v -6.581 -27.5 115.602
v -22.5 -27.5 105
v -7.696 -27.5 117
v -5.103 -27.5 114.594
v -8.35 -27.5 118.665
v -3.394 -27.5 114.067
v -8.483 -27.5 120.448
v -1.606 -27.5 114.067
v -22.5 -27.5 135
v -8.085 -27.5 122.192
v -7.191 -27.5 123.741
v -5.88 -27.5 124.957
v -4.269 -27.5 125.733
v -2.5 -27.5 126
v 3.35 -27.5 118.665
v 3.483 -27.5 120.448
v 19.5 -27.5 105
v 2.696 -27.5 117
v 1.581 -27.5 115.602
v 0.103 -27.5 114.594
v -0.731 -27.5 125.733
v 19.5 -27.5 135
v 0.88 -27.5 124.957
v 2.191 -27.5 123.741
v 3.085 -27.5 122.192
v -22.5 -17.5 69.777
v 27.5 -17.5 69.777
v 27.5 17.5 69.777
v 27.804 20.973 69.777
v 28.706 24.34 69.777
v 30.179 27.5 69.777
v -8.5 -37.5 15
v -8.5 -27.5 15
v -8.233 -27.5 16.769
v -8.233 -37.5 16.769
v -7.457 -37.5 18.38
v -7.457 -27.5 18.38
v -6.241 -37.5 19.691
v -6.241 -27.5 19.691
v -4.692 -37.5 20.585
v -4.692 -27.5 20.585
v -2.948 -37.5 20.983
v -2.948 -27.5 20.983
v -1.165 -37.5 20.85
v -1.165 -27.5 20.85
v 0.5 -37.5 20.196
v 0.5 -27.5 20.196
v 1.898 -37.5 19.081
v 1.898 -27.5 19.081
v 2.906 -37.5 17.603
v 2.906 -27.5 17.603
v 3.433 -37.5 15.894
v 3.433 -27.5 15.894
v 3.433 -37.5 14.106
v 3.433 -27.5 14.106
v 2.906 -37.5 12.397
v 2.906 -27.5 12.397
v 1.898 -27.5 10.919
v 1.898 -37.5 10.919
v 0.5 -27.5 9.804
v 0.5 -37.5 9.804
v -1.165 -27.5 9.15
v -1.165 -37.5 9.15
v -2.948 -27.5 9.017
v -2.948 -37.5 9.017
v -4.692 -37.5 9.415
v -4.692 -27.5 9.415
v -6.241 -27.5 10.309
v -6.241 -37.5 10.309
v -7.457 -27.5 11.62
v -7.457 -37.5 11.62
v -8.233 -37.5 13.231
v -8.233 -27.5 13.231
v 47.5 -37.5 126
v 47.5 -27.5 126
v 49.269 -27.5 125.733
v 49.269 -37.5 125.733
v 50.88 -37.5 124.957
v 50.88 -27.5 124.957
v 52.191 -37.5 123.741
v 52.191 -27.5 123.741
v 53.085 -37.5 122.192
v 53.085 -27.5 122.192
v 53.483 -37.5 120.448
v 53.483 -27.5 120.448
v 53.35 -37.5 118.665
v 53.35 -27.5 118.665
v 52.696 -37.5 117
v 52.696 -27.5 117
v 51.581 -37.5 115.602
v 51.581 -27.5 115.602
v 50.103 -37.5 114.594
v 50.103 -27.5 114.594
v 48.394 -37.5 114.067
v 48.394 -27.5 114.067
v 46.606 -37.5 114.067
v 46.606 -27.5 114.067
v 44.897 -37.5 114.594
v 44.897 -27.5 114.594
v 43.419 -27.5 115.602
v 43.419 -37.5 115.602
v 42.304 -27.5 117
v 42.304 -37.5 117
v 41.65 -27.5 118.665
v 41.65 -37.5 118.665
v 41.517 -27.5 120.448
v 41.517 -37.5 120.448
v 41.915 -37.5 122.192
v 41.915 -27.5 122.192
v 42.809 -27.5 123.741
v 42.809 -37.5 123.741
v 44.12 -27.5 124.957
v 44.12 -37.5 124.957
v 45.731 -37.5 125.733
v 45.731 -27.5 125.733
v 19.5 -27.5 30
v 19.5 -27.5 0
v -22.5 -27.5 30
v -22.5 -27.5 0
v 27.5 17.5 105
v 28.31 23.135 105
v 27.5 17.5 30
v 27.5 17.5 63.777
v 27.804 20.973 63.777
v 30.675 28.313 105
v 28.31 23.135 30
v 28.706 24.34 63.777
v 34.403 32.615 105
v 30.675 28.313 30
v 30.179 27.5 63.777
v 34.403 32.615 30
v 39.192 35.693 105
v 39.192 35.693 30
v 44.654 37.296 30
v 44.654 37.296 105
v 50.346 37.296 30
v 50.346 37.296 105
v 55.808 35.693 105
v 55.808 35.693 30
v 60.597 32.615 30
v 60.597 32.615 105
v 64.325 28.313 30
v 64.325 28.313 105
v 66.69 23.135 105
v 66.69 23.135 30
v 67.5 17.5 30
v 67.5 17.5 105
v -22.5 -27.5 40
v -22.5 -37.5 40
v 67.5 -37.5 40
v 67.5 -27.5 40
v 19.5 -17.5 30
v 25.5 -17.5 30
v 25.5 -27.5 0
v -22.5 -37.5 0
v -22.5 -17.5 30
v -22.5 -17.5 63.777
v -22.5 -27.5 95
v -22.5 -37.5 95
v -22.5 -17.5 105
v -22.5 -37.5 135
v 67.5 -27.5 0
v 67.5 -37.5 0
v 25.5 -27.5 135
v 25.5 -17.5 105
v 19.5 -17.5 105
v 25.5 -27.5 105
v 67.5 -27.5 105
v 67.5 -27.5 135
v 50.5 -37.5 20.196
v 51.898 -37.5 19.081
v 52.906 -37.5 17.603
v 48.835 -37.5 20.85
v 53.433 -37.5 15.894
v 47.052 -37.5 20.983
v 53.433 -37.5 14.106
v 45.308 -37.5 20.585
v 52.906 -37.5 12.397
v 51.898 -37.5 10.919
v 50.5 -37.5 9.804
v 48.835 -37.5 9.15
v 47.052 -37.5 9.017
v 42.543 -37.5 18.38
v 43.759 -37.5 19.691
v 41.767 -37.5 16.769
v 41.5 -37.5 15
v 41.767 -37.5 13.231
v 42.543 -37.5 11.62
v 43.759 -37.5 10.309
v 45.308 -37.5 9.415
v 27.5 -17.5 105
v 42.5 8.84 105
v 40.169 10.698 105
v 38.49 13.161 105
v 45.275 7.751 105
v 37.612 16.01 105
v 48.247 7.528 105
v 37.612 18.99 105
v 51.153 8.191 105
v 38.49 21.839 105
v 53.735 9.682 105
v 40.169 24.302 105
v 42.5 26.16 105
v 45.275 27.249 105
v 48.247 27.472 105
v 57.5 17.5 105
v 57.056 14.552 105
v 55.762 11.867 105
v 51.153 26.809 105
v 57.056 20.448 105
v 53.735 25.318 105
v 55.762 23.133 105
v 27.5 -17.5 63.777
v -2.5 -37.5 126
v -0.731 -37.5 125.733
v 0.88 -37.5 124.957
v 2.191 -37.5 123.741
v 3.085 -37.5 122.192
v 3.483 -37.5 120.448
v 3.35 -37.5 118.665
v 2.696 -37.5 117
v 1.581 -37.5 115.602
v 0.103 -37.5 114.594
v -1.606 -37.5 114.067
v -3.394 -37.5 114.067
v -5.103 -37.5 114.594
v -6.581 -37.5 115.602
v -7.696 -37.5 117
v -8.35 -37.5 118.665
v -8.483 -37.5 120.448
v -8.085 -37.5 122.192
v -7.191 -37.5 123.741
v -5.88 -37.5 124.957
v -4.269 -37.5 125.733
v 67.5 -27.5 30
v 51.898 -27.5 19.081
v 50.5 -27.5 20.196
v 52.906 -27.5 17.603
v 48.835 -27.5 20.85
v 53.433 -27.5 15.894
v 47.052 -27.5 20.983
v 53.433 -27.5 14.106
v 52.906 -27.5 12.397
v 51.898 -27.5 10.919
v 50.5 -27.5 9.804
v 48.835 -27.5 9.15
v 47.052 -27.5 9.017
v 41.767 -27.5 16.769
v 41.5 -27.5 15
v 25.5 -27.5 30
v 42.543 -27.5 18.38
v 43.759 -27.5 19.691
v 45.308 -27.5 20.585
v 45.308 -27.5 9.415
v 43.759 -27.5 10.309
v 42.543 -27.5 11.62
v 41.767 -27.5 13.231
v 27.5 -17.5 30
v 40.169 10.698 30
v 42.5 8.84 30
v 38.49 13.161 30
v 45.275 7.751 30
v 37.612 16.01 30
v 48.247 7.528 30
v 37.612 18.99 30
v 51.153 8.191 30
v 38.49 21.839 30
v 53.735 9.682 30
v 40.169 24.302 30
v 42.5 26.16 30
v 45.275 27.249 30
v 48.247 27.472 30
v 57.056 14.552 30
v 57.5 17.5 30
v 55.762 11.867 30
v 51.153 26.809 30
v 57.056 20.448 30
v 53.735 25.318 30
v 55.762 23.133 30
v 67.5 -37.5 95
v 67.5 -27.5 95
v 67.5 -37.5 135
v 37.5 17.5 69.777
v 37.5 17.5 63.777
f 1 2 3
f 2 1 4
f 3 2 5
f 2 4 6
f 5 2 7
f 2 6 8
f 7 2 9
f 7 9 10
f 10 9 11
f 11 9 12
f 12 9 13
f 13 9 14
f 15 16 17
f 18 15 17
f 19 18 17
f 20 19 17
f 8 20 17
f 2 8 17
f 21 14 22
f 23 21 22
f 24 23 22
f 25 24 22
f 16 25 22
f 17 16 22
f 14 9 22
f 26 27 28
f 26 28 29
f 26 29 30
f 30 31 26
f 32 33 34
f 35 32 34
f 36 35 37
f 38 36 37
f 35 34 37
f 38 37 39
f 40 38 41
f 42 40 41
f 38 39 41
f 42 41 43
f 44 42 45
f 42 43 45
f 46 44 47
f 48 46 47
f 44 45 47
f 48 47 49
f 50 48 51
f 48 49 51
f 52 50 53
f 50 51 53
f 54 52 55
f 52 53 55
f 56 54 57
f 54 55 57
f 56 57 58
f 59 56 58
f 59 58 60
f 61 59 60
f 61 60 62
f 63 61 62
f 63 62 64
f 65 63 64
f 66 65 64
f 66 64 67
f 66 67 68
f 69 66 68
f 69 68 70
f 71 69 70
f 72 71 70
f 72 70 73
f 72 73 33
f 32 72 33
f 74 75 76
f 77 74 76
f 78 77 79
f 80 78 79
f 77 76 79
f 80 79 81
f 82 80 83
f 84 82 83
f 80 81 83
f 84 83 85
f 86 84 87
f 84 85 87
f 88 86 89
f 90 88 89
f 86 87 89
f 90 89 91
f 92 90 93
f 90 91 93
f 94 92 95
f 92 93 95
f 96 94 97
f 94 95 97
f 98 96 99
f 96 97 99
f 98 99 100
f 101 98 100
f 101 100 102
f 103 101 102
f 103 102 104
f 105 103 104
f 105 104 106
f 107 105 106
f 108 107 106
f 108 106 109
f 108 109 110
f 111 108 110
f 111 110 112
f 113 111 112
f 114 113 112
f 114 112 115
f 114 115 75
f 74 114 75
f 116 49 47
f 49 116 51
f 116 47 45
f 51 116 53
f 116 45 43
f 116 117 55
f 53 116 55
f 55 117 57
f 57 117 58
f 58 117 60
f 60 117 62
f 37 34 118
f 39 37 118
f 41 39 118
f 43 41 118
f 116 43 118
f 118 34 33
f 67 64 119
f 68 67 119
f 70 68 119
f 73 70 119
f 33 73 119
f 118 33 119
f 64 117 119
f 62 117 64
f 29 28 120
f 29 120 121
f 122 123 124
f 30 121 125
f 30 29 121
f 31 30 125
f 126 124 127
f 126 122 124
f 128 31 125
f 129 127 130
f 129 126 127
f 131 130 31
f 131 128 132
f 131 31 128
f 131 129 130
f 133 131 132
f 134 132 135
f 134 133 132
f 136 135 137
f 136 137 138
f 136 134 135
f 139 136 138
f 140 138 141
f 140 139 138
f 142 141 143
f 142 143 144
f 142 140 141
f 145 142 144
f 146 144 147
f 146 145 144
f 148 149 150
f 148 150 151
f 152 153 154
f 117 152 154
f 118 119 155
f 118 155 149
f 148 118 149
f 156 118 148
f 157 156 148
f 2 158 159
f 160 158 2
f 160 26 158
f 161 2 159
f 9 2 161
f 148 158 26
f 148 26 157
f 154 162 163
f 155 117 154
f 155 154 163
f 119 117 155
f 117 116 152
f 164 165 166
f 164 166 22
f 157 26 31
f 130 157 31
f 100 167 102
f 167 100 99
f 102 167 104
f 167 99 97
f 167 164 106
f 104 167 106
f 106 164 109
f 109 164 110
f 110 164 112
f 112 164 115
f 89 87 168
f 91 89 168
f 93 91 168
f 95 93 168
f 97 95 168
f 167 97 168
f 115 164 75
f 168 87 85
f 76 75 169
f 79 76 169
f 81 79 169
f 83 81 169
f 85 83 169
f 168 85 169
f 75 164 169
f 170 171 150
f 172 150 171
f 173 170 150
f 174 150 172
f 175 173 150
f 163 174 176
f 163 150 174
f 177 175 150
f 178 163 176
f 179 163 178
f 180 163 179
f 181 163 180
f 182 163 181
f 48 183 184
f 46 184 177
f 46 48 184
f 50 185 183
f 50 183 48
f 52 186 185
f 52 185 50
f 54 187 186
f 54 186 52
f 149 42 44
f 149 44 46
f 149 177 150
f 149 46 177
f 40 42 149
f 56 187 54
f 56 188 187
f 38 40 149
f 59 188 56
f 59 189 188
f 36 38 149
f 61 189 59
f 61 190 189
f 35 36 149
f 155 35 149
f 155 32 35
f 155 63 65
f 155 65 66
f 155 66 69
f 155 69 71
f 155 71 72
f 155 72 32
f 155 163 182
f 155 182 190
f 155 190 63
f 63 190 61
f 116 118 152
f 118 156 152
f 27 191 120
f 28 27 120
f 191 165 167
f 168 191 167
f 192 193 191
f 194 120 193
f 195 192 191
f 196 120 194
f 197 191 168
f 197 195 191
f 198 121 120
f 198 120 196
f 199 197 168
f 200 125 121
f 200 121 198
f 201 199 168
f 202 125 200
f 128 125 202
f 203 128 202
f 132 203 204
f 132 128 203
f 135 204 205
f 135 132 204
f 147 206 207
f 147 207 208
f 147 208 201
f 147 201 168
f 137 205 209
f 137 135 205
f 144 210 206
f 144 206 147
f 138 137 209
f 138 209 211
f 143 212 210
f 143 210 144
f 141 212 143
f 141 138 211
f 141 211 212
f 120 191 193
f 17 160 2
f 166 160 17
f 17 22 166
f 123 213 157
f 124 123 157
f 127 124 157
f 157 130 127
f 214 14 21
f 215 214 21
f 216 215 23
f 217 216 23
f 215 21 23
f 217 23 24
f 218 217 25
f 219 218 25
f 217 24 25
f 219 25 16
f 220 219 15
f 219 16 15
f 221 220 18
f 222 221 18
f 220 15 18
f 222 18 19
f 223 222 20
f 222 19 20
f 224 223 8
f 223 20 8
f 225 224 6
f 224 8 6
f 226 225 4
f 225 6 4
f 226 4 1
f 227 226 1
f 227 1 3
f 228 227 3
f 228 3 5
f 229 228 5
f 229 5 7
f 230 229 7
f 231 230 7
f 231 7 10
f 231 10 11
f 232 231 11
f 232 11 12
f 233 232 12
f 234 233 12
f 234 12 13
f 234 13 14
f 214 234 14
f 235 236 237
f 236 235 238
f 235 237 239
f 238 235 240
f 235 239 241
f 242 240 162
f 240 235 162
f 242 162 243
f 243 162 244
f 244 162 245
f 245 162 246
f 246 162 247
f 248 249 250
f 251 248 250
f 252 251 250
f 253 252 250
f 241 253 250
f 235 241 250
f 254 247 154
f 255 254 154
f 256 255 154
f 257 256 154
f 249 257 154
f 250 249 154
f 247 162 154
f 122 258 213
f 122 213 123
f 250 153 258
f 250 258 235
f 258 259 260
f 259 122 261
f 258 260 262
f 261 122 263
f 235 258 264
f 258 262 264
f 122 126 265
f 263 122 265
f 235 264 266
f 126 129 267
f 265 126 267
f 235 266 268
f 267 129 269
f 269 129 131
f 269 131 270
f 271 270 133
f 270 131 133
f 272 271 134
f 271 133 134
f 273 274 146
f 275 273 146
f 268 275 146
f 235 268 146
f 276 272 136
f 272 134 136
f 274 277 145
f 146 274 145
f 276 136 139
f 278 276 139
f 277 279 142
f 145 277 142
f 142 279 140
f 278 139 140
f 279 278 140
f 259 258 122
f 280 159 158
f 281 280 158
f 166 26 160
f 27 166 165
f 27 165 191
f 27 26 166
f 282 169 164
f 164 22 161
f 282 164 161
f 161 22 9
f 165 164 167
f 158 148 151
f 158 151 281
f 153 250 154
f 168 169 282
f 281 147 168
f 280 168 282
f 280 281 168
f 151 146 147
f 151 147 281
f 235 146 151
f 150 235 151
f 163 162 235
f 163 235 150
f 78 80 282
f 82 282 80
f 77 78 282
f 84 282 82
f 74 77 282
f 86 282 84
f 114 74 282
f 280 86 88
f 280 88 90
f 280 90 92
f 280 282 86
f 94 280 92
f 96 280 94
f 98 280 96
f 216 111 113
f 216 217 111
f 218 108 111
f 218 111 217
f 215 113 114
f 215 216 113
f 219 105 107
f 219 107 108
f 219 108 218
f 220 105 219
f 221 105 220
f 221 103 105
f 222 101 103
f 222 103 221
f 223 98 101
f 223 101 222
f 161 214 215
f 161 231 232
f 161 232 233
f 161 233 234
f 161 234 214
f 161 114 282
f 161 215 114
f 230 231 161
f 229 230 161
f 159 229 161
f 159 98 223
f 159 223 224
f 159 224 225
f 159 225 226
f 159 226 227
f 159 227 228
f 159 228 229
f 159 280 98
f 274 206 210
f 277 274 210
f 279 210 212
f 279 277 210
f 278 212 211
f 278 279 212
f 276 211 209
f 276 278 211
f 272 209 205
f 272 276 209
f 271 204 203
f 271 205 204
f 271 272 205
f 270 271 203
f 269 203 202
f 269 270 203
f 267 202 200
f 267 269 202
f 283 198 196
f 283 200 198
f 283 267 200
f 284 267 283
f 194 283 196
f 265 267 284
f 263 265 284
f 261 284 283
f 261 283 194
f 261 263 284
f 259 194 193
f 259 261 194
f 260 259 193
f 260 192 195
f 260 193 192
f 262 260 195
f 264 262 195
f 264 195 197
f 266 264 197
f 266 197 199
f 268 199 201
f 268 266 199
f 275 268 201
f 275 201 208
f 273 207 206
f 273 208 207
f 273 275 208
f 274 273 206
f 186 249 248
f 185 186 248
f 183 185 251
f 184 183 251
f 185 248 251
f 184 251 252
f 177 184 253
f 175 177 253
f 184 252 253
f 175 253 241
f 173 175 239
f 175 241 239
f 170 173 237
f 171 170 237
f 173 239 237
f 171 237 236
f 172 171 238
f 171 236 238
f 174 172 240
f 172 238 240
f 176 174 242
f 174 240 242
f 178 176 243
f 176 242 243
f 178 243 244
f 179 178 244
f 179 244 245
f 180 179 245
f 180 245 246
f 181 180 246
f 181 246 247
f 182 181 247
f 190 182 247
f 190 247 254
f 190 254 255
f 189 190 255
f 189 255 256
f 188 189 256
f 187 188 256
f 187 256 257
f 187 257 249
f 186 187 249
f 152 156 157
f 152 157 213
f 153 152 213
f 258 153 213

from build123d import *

# Parameters (mm, degrees)
SKETCH2_R                = 10
BOSS_EXTRUDE1_DEPTH      = 135
SKETCH4_W                = 90
SKETCH4_H                = 10
CUT_EXTRUDE1_DEPTH       = 30
SKETCH6_W                = 90
SKETCH6_H                = 10
CUT_EXTRUDE2_DEPTH       = 30
CUT_EXTRUDE3_DEPTH       = 30
CUT_EXTRUDE4_START       = -30
CUT_EXTRUDE4_DEPTH       = 30
SKETCH11_W               = 55
SKETCH11_H               = 20
CUT_EXTRUDE5_DEPTH       = 167.527024834
SKETCH12_R               = 6
CUT_EXTRUDE6_DEPTH       = 165.335784295
SKETCH13_R               = 6
CUT_EXTRUDE7_DEPTH       = 165.335784295
SKETCH14_W               = 6
SKETCH14_H               = 30
BOSS_EXTRUDE3_DEPTH      = 10
SKETCH15_W               = 6
SKETCH15_H               = 30
BOSS_EXTRUDE4_DEPTH      = 10
CUT_EXTRUDE8_DEPTH       = 149.105536696
CUT_EXTRUDE8_DEPTH_BACK  = 149.105536696
CUT_EXTRUDE9_DEPTH       = 149.105536696
CUT_EXTRUDE9_DEPTH_BACK  = 149.105536696
BOSS_EXTRUDE5_DEPTH      = 50
BOSS_EXTRUDE5_DEPTH_BACK = 10
SKETCH18_W               = 6
SKETCH18_H               = 45
CUT_EXTRUDE10_DEPTH      = 106.048466338
CUT_EXTRUDE10_DEPTH_BACK = 106.048466338


with BuildPart() as part:
    # Sketch2 → Boss-Extrude1 (new body)
    with BuildSketch(Plane.XY):
        with BuildLine():
            Line((67.5, 17.5), (67.5, -37.5))
            Line((67.5, -37.5), (-22.5, -37.5))
            Line((-22.5, -37.5), (-22.5, -17.5))
            Line((-22.5, -17.5), (27.5, -17.5))
            Line((27.5, -17.5), (27.5, 17.5))
            ThreePointArc((27.5, 17.5), (47.5, 37.5), (67.5, 17.5))
        make_face()
        with Locations((47.5, 17.5)):
            Circle(SKETCH2_R, mode=Mode.SUBTRACT)
    extrude(amount=BOSS_EXTRUDE1_DEPTH)

    # Sketch4 → Cut-Extrude1 (cut)
    with BuildSketch(Plane.XY.offset(135)):
        with Locations((22.5, -22.5)):
            Rectangle(SKETCH4_W, SKETCH4_H)
    extrude(amount=-CUT_EXTRUDE1_DEPTH, mode=Mode.SUBTRACT)

    # Sketch6 → Cut-Extrude2 (cut)
    with BuildSketch(Plane(origin=(0, 0, 0), x_dir=(-1, 0, 0), z_dir=(0, 0, -1))):
        with Locations((-22.5, -22.5)):
            Rectangle(SKETCH6_W, SKETCH6_H)
    extrude(amount=-CUT_EXTRUDE2_DEPTH, mode=Mode.SUBTRACT)

    # Sketch9 → Cut-Extrude3 (cut)
    with BuildSketch(Plane(origin=(0, 0, 0), x_dir=(-1, 0, 0), z_dir=(0, 0, -1))):
        with BuildLine():
            Line((-67.5, -17.5), (-67.5, 17.5))
            ThreePointArc((-67.5, 17.5), (-47.5, 37.5), (-27.5, 17.5))
            Line((-27.5, 17.5), (-27.5, -17.5))
            Line((-27.5, -17.5), (-67.5, -17.5))
        make_face()
    extrude(amount=-CUT_EXTRUDE3_DEPTH, mode=Mode.SUBTRACT)

    # Sketch10 → Cut-Extrude4 (cut)
    with BuildSketch(Plane.XY.offset(135).offset(CUT_EXTRUDE4_START)):
        with BuildLine():
            Line((27.5, -17.5), (67.5, -17.5))
            Line((67.5, -17.5), (67.5, 17.5))
            ThreePointArc((67.5, 17.5), (47.5, 37.5), (27.5, 17.5))
            Line((27.5, 17.5), (27.5, -17.5))
        make_face()
    extrude(amount=CUT_EXTRUDE4_DEPTH, mode=Mode.SUBTRACT)

    # Sketch11 → Cut-Extrude5 (cut, through all)
    with BuildSketch(Plane.ZY.offset(22.5)):
        with Locations((67.5, -37.5)):
            Rectangle(SKETCH11_W, SKETCH11_H)
    extrude(amount=-CUT_EXTRUDE5_DEPTH, mode=Mode.SUBTRACT)

    # Sketch12 → Cut-Extrude6 (cut, through all)
    with BuildSketch(Plane(origin=(0, -27.5, 0), x_dir=(1, 0, 0), z_dir=(0, 1, 0))):
        with Locations(Location((-2.5, -120, 0), (0, 0, 270))):
            Circle(SKETCH12_R)
        with Locations(Location((47.5, -120, 0), (0, 0, 270))):
            Circle(SKETCH12_R)
    extrude(amount=-CUT_EXTRUDE6_DEPTH, mode=Mode.SUBTRACT)

    # Sketch13 → Cut-Extrude7 (cut, through all)
    with BuildSketch(Plane(origin=(0, -27.5, 0), x_dir=(1, 0, 0), z_dir=(0, 1, 0))):
        with Locations(Location((47.5, -15, 0), (0, 0, 180))):
            Circle(SKETCH13_R)
        with Locations(Location((-2.5, -15, 0), (0, 0, 180))):
            Circle(SKETCH13_R)
    extrude(amount=-CUT_EXTRUDE7_DEPTH, mode=Mode.SUBTRACT)

    # Sketch14 → Boss-Extrude3 (add)
    with BuildSketch(Plane(origin=(0, -27.5, 0), x_dir=(1, 0, 0), z_dir=(0, 1, 0))):
        with Locations((22.5, -120)):
            Rectangle(SKETCH14_W, SKETCH14_H)
    extrude(amount=BOSS_EXTRUDE3_DEPTH)

    # Sketch15 → Boss-Extrude4 (add)
    with BuildSketch(Plane(origin=(0, -27.5, 0), x_dir=(1, 0, 0), z_dir=(0, 1, 0))):
        with Locations((22.5, -15)):
            Rectangle(SKETCH15_W, SKETCH15_H)
    extrude(amount=BOSS_EXTRUDE4_DEPTH)

    # Sketch16 → Cut-Extrude8 (cut, two sides: drawn at the far end of the back side and taken through both)
    with BuildSketch(Plane.ZY.offset(-19.5).offset(-CUT_EXTRUDE8_DEPTH_BACK)):
        Polygon((105, -17.5), (135, -27.5), (135, -17.5), align=None)
    extrude(amount=CUT_EXTRUDE8_DEPTH + CUT_EXTRUDE8_DEPTH_BACK, mode=Mode.SUBTRACT)

    # Sketch17 → Cut-Extrude9 (cut, two sides: drawn at the far end of the back side and taken through both)
    with BuildSketch(Plane.ZY.offset(-19.5).offset(-CUT_EXTRUDE9_DEPTH_BACK)):
        Polygon((30, -17.5), (0, -27.5), (0, -17.5), align=None)
    extrude(amount=CUT_EXTRUDE9_DEPTH + CUT_EXTRUDE9_DEPTH_BACK, mode=Mode.SUBTRACT)

    # Sketch18 → Boss-Extrude5 (add, two sides: drawn at the far end of the back side and taken through both)
    with BuildSketch(Plane.ZY.offset(-27.5).offset(-BOSS_EXTRUDE5_DEPTH_BACK)):
        with Locations((66.77724886, 5)):
            Rectangle(SKETCH18_W, SKETCH18_H)
    extrude(amount=BOSS_EXTRUDE5_DEPTH + BOSS_EXTRUDE5_DEPTH_BACK)

    # Sketch19 → Cut-Extrude10 (cut, two sides: drawn at the far end of the back side and taken through both)
    with BuildSketch(Plane(origin=(0, 0, 63.77724886), x_dir=(-1, 0, 0), z_dir=(0, 0, -1)).offset(-CUT_EXTRUDE10_DEPTH_BACK)):
        Polygon((22.5, -17.5), (-30.179491924, 27.5), (22.5, 27.5), align=None)
    extrude(amount=CUT_EXTRUDE10_DEPTH + CUT_EXTRUDE10_DEPTH_BACK, mode=Mode.SUBTRACT)


solid = part.part
